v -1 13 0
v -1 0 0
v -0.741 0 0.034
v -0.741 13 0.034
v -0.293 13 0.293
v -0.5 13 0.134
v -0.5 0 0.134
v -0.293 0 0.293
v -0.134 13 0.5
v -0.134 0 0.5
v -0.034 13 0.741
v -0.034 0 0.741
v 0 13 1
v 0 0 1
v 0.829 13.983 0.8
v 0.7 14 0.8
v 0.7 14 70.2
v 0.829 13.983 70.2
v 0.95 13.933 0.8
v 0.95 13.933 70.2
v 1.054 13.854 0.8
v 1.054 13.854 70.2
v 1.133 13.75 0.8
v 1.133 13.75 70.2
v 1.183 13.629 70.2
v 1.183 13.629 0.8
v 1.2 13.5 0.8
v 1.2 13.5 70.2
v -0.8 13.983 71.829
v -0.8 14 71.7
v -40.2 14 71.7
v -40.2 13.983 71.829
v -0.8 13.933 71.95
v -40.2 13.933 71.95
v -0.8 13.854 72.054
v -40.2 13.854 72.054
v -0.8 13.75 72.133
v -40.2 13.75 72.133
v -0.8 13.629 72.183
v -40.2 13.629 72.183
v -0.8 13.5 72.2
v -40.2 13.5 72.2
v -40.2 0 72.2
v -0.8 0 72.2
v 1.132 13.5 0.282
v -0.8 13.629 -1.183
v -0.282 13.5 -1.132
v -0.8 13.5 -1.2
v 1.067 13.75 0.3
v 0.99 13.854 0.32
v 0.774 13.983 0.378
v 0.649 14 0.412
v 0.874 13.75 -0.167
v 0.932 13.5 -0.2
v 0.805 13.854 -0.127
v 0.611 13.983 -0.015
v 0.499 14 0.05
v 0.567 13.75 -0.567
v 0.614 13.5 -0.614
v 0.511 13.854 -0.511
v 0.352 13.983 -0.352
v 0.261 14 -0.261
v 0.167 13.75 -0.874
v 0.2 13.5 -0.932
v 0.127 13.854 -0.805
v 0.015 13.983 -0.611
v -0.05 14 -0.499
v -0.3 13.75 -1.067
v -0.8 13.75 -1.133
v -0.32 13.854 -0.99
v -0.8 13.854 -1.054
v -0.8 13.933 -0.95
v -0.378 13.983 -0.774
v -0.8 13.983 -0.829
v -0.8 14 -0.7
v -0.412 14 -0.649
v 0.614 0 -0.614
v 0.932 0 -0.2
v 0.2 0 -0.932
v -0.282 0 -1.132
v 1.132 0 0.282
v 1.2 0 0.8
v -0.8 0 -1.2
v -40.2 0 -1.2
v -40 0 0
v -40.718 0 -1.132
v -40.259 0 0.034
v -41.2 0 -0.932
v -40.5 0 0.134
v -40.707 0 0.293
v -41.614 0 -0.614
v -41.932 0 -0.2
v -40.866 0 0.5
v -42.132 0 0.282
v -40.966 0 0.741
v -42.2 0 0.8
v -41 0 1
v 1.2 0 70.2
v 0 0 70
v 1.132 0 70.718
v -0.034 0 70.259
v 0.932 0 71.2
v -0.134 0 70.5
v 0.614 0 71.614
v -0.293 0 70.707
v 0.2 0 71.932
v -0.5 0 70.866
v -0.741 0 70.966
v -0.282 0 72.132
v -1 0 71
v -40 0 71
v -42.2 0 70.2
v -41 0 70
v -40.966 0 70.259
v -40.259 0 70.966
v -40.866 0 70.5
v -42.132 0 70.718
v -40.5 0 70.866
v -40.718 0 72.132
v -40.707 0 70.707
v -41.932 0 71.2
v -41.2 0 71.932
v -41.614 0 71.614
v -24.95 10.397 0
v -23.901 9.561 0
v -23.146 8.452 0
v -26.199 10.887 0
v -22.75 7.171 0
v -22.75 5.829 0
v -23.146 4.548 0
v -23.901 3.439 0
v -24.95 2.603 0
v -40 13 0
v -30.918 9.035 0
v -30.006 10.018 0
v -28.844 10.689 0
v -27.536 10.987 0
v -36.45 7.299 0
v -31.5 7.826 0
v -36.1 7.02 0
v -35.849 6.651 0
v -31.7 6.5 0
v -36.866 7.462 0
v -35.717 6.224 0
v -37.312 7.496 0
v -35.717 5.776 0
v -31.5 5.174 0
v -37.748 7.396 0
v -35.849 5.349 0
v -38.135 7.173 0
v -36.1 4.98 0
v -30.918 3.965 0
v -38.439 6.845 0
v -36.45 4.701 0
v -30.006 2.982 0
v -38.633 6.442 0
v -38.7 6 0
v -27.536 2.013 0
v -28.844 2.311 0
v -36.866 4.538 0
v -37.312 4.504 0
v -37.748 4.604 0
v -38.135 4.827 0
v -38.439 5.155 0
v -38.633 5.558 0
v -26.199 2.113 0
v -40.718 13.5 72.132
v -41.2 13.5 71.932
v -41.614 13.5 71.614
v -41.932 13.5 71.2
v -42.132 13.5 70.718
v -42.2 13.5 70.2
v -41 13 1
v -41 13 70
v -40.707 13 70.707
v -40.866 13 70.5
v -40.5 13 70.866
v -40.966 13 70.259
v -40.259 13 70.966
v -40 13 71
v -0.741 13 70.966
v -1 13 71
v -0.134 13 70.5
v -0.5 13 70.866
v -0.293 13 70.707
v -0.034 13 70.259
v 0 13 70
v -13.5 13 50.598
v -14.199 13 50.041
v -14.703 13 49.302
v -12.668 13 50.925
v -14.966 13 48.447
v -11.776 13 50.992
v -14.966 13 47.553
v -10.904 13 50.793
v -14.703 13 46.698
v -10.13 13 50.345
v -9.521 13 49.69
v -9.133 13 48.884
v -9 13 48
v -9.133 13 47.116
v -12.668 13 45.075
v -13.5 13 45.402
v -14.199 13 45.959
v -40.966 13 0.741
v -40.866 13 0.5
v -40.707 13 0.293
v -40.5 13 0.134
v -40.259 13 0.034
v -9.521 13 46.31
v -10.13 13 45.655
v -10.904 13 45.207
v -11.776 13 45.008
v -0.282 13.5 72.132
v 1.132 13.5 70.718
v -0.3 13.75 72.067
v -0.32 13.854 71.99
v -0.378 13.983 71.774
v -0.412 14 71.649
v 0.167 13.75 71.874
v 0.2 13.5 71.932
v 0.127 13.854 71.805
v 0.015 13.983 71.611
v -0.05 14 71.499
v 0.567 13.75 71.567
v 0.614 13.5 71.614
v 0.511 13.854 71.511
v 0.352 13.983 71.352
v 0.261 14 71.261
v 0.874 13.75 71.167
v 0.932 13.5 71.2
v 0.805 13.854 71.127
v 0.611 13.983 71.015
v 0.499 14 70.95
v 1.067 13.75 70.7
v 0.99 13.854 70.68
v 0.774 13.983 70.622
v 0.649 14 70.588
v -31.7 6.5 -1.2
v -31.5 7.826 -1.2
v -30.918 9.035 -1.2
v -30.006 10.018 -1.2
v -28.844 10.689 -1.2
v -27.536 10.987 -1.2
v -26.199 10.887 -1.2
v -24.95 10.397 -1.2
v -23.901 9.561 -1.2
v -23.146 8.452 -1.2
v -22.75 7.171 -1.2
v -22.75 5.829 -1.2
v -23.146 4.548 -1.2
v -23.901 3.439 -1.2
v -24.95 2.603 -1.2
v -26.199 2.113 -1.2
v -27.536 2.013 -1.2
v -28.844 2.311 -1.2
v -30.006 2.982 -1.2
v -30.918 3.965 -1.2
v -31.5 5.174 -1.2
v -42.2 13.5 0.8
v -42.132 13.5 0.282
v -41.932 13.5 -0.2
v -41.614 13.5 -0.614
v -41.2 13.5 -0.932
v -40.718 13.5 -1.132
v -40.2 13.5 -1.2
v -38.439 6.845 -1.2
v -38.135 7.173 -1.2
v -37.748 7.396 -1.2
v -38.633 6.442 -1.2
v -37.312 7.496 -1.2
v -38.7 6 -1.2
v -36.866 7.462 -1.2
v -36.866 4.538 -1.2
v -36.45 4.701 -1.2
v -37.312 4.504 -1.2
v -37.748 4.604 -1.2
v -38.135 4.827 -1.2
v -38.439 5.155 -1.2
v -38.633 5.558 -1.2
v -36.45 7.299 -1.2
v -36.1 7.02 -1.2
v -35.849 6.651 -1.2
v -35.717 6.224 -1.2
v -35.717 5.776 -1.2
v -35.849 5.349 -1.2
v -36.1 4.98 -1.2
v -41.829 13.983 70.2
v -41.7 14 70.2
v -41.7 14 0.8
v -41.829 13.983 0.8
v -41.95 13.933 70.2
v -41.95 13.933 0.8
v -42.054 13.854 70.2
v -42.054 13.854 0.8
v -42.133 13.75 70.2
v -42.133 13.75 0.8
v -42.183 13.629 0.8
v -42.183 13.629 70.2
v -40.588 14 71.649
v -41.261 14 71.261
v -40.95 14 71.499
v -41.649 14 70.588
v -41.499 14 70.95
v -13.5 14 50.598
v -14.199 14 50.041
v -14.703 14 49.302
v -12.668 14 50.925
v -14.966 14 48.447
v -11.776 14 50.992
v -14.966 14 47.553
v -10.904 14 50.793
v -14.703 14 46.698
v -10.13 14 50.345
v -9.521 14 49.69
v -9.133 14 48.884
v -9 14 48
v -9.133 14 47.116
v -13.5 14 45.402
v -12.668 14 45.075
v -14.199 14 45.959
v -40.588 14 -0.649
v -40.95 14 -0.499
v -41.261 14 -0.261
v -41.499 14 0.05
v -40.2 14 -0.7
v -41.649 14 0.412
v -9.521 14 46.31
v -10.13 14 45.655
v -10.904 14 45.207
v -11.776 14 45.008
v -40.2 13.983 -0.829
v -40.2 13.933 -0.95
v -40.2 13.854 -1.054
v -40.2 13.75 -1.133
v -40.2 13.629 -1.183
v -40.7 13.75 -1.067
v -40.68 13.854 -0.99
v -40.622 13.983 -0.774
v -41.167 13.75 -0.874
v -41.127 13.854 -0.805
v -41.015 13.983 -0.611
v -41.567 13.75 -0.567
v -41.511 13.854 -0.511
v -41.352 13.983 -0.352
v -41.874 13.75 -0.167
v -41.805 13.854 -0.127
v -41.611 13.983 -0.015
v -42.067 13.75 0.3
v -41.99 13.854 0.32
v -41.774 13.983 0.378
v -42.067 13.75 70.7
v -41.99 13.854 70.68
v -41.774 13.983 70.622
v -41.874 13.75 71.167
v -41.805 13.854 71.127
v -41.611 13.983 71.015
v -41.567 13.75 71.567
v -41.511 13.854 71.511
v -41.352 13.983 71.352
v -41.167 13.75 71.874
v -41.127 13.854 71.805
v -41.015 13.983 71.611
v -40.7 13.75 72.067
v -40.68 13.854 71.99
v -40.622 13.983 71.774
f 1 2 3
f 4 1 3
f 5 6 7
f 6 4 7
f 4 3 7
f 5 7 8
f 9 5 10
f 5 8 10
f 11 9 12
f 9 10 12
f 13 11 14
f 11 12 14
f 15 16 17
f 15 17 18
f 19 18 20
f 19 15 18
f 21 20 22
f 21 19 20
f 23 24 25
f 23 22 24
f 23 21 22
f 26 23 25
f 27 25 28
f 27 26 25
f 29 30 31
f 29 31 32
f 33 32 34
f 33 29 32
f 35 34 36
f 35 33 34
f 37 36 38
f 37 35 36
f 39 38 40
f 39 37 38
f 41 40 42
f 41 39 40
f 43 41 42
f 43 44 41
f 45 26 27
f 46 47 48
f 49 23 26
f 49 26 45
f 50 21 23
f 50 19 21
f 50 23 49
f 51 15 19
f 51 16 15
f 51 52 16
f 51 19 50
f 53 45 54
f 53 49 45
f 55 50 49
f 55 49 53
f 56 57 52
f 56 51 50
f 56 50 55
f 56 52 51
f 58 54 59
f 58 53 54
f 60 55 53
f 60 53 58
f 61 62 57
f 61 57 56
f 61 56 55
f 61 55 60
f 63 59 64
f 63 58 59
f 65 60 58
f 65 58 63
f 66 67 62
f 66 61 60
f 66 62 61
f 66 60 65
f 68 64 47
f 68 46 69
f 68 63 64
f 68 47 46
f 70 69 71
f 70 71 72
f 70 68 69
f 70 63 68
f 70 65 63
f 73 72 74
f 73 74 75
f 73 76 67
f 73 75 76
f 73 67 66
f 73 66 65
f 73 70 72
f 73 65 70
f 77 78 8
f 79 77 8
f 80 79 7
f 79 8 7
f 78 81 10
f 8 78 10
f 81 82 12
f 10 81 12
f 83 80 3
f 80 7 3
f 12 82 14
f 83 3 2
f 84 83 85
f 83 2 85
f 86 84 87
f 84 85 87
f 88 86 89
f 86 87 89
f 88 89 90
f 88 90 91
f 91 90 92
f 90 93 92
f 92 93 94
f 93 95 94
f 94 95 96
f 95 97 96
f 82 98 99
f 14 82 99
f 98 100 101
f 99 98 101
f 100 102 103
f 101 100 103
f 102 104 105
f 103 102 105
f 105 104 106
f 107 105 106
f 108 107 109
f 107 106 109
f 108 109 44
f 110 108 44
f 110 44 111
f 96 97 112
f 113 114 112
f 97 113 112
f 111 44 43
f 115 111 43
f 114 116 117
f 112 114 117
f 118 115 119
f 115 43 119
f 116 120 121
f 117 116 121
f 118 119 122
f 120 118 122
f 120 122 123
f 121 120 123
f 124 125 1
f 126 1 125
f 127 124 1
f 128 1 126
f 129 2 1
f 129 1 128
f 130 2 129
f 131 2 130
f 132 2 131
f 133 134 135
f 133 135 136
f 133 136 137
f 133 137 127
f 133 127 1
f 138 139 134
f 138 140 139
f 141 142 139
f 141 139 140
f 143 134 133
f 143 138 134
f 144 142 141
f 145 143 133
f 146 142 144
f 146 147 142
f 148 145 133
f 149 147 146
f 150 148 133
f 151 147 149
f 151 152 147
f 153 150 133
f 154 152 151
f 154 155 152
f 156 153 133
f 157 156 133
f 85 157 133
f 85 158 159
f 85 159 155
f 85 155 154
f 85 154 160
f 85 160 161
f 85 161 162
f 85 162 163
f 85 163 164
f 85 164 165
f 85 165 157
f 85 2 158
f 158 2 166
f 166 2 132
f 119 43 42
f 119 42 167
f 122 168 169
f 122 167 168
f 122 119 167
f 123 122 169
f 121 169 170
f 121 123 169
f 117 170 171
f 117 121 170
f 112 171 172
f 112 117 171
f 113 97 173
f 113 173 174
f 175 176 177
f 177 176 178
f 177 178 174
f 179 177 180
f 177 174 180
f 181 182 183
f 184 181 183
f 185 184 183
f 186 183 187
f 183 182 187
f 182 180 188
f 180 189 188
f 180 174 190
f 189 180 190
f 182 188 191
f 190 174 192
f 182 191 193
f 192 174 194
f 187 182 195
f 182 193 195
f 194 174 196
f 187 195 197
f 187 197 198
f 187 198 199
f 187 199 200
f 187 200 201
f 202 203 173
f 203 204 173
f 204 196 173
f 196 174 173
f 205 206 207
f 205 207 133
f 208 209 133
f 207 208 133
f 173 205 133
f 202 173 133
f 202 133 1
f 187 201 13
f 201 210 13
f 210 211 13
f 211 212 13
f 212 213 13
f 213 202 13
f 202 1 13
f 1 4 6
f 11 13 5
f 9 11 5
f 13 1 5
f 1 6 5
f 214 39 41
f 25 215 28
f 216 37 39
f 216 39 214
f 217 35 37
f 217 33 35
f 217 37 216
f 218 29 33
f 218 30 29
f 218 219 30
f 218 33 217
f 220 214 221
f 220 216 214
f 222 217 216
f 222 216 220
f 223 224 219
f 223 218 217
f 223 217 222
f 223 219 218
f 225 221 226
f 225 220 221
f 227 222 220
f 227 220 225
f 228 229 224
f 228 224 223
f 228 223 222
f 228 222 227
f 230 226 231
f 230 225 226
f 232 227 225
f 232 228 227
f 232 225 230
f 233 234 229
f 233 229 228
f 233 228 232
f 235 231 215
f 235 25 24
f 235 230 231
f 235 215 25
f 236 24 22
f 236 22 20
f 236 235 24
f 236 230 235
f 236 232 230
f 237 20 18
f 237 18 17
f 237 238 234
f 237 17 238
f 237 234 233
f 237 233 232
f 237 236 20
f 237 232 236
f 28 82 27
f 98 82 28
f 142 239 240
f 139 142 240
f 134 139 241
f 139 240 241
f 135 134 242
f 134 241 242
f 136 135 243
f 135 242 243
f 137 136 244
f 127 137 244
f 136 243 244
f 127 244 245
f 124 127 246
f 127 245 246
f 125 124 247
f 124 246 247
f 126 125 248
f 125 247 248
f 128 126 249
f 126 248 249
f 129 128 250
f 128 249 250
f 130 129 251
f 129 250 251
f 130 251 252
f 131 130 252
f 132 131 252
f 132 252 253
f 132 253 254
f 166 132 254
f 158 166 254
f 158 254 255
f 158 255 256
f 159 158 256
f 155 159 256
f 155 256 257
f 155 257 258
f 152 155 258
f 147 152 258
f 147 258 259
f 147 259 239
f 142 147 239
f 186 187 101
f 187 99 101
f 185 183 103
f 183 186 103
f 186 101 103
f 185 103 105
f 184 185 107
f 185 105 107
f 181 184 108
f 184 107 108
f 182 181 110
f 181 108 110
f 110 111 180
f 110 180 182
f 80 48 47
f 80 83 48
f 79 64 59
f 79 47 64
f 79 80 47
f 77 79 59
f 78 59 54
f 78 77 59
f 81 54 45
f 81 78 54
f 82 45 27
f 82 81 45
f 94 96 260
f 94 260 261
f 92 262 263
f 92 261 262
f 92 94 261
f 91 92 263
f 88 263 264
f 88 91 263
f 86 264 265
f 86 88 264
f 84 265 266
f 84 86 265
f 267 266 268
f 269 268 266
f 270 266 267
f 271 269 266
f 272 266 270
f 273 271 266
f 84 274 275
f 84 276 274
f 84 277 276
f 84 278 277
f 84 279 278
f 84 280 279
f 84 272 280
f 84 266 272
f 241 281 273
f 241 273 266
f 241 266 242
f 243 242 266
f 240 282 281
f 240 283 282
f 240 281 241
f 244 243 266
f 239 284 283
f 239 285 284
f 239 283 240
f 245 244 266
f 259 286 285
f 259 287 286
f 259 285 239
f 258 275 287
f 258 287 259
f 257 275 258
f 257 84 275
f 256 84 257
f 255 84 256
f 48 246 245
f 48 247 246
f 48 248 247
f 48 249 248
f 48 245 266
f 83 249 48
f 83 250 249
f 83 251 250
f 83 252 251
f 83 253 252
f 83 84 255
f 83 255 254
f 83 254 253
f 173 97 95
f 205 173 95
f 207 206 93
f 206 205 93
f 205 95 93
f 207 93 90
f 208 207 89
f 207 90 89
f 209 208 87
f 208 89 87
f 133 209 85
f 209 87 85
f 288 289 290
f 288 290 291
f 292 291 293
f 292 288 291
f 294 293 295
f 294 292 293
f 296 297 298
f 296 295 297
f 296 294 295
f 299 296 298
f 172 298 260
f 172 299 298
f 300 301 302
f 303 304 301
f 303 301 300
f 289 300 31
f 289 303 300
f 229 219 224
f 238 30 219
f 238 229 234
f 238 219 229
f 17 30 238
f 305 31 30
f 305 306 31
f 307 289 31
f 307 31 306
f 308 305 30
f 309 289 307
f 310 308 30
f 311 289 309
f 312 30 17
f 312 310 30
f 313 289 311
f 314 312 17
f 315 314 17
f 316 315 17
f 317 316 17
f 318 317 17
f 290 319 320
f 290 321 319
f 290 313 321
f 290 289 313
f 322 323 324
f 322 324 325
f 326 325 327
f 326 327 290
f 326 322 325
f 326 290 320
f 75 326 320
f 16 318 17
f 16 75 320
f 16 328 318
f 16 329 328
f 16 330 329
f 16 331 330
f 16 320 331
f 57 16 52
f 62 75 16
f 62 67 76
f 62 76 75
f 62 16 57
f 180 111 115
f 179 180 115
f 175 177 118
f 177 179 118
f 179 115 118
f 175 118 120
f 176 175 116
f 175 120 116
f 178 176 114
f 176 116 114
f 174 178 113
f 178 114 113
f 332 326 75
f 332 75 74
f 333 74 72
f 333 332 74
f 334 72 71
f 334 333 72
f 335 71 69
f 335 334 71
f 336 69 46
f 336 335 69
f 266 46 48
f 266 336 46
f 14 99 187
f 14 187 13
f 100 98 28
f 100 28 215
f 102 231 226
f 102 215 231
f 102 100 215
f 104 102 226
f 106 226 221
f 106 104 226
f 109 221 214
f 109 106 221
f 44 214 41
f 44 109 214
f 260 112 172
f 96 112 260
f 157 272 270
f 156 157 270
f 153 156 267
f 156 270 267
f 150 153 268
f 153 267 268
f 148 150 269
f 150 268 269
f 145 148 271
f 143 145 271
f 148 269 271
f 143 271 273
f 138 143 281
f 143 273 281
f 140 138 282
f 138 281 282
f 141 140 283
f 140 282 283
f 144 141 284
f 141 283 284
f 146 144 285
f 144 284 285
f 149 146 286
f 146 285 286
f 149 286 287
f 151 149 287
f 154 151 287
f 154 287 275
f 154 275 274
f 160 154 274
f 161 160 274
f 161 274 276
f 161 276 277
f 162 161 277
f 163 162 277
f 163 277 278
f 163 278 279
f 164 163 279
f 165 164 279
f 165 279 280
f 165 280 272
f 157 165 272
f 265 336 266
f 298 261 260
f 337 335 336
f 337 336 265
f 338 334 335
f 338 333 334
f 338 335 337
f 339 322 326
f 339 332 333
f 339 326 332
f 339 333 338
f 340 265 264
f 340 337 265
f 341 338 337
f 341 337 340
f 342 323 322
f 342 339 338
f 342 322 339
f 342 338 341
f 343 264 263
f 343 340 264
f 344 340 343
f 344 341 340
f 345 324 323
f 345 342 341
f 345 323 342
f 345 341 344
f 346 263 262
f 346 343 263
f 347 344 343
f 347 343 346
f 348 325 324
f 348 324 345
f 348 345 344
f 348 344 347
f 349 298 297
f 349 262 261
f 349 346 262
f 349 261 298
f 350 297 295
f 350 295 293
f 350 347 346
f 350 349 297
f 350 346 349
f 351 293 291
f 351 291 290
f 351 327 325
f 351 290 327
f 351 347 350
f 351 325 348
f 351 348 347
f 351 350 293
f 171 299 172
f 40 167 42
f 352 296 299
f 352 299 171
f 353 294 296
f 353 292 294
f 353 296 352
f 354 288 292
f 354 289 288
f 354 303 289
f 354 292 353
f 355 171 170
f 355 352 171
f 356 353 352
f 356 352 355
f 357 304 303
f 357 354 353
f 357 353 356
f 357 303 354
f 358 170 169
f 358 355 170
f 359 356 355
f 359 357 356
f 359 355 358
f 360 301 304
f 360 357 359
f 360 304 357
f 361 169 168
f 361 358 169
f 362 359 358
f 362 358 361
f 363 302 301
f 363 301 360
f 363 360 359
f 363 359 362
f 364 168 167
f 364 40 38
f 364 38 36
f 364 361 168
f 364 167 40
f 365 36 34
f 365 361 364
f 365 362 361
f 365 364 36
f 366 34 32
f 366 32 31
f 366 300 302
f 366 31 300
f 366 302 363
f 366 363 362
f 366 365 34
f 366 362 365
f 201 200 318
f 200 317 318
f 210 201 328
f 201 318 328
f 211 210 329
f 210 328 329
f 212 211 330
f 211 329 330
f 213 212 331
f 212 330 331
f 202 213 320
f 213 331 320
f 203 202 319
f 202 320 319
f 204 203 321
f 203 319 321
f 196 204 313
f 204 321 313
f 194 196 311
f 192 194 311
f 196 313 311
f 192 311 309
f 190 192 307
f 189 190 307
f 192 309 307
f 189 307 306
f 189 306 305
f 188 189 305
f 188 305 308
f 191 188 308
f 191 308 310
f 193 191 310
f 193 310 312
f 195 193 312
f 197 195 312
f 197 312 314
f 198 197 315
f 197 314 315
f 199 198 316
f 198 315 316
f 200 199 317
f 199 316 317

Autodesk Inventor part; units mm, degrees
ref_plane "YZ Plane" through (0, 0, 0) normal (1, 0, 0) x (0, 1, 0)
ref_plane "XZ Plane" through (0, 0, 0) normal (0, 1, 0) x (-1, 0, 0)
ref_plane "XY Plane" through (0, 0, 0) normal (0, 0, 1) x (1, 0, 0)
sketch "Skizze1" plane through (0, 0, 0) normal (0, 1, 0) x (-1, 0, 0)
  line L0 (1, 0) -> (40, 0)
  line L1 (41, 1) -> (41, 70)
  line L2 (40, 71) -> (1, 71)
  line L3 (0, 70) -> (0, 1)
  line L4 (42.2, 70.2) -> (42.2, 0.8)
  line L5 (40.2, -1.2) -> (0.8, -1.2)
  line L6 (-1.2, 0.8) -> (-1.2, 70.2)
  line L7 (0.8, 72.2) -> (40.2, 72.2)
  arc A0 (42.2, 70.2) -> (40.2, 72.2) centre (40.2, 70.2) ccw
  arc A1 (40.2, -1.2) -> (42.2, 0.8) centre (40.2, 0.8) ccw
  arc A2 (-1.2, 0.8) -> (0.8, -1.2) centre (0.8, 0.8) ccw
  arc A3 (0.8, 72.2) -> (-1.2, 70.2) centre (0.8, 70.2) ccw
  arc A4 (41, 70) -> (40, 71) centre (40, 70) ccw
  arc A5 (40, 0) -> (41, 1) centre (40, 1) ccw
  arc A6 (0, 1) -> (1, 0) centre (1, 1) ccw
  arc A7 (1, 71) -> (0, 70) centre (1, 70) ccw
  point P0 (0, 0)
  point P1 (41, 71)
  point P2 (41, 0)
  point P3 (0, 71)
  dimension "d0" = 41
  dimension "d1" = 71
  dimension "d2" = 1.2
  dimension "d3" = 2
  dimension "d4" = 1
extrude "Extrusion1" add sketch "Skizze1" along normal blind 13
sketch "Skizze2" plane through (0, 13, 0) normal (0, 1, 0) x (1, 0, 0)
  line L0 (1.2, -70.2) -> (1.2, -0.8) projected
  arc A0 (1.2, -0.8) -> (-0.8, 1.2) centre (-0.8, -0.8) ccw projected
  line L1 (-0.8, 1.2) -> (-40.2, 1.2) projected
  arc A1 (-40.2, 1.2) -> (-42.2, -0.8) centre (-40.2, -0.8) ccw projected
  line L2 (-42.2, -0.8) -> (-42.2, -70.2) projected
  arc A2 (-42.2, -70.2) -> (-40.2, -72.2) centre (-40.2, -70.2) ccw projected
  line L3 (-40.2, -72.2) -> (-0.8, -72.2) projected
  arc A3 (-0.8, -72.2) -> (1.2, -70.2) centre (-0.8, -70.2) ccw projected
  arc A4 (0, -1) -> (-1, 0) centre (-1, -1) ccw projected
  line L4 (0, -1) -> (0, -70) projected
  arc A5 (-1, -71) -> (0, -70) centre (-1, -70) ccw projected
  line L5 (-1, -71) -> (-40, -71) projected
  arc A6 (-41, -70) -> (-40, -71) centre (-40, -70) ccw projected
  line L6 (-41, -70) -> (-41, -1) projected
  arc A7 (-40, 0) -> (-41, -1) centre (-40, -1) ccw projected
  line L7 (-40, 0) -> (-1, 0) projected
  point P0 (0, 0)
extrude "Extrusion2" add sketch "Skizze2" along normal blind 1 contours A3 L3 A2 L2 A1 L1 A0 L0 | L4 A5 L5 A6 L6 A7 L7 A4
fillet "Rundung1" radius 0.5 8 edges at (0.6142, 14, -0.6142) (-20.5, 14, -1.2) (-41.6142, 14, -0.6142) (-42.2, 14, 35.5) (-41.6142, 14, 71.6142) (-20.5, 14, 72.2) (0.6142, 14, 71.6142) (1.2, 14, 35.5)
sketch "Skizze3" plane through (0, 14, 0) normal (0, 1, 0) x (1, 0, 0)
  circle A0 centre (-12, -48) radius 3
  line L0 (0, -1) -> (0, -70) projected
  line L1 (-40, 0) -> (-1, 0) projected
  point P0 (0, 0)
  dimension "d10" = 6
  dimension "d11" = 12
  dimension "d12" = 48
extrude "Extrusion3" cut sketch "Skizze3" against normal blind 1
sketch "Skizze4" plane through (-0.8, 0, -1.2) normal (0, 0, -1) x (-1, 0, 0)
  circle A0 centre (26.4, 6.5) radius 4.5
  line L0 (0, 0) -> (39.4, 0) projected
  line L1 (41.4, 0) -> (41.4, 13.5) projected
  circle A1 centre (36.4, 6) radius 1.5
  point P0 (-0.8, 0)
  dimension "d15" = 9
  dimension "d16" = 6.5
  dimension "d17" = 15
  dimension "d18" = 3
  dimension "d19" = 5
extrude "Extrusion4" cut sketch "Skizze4" against normal blind 5
properties part number "wanne"
